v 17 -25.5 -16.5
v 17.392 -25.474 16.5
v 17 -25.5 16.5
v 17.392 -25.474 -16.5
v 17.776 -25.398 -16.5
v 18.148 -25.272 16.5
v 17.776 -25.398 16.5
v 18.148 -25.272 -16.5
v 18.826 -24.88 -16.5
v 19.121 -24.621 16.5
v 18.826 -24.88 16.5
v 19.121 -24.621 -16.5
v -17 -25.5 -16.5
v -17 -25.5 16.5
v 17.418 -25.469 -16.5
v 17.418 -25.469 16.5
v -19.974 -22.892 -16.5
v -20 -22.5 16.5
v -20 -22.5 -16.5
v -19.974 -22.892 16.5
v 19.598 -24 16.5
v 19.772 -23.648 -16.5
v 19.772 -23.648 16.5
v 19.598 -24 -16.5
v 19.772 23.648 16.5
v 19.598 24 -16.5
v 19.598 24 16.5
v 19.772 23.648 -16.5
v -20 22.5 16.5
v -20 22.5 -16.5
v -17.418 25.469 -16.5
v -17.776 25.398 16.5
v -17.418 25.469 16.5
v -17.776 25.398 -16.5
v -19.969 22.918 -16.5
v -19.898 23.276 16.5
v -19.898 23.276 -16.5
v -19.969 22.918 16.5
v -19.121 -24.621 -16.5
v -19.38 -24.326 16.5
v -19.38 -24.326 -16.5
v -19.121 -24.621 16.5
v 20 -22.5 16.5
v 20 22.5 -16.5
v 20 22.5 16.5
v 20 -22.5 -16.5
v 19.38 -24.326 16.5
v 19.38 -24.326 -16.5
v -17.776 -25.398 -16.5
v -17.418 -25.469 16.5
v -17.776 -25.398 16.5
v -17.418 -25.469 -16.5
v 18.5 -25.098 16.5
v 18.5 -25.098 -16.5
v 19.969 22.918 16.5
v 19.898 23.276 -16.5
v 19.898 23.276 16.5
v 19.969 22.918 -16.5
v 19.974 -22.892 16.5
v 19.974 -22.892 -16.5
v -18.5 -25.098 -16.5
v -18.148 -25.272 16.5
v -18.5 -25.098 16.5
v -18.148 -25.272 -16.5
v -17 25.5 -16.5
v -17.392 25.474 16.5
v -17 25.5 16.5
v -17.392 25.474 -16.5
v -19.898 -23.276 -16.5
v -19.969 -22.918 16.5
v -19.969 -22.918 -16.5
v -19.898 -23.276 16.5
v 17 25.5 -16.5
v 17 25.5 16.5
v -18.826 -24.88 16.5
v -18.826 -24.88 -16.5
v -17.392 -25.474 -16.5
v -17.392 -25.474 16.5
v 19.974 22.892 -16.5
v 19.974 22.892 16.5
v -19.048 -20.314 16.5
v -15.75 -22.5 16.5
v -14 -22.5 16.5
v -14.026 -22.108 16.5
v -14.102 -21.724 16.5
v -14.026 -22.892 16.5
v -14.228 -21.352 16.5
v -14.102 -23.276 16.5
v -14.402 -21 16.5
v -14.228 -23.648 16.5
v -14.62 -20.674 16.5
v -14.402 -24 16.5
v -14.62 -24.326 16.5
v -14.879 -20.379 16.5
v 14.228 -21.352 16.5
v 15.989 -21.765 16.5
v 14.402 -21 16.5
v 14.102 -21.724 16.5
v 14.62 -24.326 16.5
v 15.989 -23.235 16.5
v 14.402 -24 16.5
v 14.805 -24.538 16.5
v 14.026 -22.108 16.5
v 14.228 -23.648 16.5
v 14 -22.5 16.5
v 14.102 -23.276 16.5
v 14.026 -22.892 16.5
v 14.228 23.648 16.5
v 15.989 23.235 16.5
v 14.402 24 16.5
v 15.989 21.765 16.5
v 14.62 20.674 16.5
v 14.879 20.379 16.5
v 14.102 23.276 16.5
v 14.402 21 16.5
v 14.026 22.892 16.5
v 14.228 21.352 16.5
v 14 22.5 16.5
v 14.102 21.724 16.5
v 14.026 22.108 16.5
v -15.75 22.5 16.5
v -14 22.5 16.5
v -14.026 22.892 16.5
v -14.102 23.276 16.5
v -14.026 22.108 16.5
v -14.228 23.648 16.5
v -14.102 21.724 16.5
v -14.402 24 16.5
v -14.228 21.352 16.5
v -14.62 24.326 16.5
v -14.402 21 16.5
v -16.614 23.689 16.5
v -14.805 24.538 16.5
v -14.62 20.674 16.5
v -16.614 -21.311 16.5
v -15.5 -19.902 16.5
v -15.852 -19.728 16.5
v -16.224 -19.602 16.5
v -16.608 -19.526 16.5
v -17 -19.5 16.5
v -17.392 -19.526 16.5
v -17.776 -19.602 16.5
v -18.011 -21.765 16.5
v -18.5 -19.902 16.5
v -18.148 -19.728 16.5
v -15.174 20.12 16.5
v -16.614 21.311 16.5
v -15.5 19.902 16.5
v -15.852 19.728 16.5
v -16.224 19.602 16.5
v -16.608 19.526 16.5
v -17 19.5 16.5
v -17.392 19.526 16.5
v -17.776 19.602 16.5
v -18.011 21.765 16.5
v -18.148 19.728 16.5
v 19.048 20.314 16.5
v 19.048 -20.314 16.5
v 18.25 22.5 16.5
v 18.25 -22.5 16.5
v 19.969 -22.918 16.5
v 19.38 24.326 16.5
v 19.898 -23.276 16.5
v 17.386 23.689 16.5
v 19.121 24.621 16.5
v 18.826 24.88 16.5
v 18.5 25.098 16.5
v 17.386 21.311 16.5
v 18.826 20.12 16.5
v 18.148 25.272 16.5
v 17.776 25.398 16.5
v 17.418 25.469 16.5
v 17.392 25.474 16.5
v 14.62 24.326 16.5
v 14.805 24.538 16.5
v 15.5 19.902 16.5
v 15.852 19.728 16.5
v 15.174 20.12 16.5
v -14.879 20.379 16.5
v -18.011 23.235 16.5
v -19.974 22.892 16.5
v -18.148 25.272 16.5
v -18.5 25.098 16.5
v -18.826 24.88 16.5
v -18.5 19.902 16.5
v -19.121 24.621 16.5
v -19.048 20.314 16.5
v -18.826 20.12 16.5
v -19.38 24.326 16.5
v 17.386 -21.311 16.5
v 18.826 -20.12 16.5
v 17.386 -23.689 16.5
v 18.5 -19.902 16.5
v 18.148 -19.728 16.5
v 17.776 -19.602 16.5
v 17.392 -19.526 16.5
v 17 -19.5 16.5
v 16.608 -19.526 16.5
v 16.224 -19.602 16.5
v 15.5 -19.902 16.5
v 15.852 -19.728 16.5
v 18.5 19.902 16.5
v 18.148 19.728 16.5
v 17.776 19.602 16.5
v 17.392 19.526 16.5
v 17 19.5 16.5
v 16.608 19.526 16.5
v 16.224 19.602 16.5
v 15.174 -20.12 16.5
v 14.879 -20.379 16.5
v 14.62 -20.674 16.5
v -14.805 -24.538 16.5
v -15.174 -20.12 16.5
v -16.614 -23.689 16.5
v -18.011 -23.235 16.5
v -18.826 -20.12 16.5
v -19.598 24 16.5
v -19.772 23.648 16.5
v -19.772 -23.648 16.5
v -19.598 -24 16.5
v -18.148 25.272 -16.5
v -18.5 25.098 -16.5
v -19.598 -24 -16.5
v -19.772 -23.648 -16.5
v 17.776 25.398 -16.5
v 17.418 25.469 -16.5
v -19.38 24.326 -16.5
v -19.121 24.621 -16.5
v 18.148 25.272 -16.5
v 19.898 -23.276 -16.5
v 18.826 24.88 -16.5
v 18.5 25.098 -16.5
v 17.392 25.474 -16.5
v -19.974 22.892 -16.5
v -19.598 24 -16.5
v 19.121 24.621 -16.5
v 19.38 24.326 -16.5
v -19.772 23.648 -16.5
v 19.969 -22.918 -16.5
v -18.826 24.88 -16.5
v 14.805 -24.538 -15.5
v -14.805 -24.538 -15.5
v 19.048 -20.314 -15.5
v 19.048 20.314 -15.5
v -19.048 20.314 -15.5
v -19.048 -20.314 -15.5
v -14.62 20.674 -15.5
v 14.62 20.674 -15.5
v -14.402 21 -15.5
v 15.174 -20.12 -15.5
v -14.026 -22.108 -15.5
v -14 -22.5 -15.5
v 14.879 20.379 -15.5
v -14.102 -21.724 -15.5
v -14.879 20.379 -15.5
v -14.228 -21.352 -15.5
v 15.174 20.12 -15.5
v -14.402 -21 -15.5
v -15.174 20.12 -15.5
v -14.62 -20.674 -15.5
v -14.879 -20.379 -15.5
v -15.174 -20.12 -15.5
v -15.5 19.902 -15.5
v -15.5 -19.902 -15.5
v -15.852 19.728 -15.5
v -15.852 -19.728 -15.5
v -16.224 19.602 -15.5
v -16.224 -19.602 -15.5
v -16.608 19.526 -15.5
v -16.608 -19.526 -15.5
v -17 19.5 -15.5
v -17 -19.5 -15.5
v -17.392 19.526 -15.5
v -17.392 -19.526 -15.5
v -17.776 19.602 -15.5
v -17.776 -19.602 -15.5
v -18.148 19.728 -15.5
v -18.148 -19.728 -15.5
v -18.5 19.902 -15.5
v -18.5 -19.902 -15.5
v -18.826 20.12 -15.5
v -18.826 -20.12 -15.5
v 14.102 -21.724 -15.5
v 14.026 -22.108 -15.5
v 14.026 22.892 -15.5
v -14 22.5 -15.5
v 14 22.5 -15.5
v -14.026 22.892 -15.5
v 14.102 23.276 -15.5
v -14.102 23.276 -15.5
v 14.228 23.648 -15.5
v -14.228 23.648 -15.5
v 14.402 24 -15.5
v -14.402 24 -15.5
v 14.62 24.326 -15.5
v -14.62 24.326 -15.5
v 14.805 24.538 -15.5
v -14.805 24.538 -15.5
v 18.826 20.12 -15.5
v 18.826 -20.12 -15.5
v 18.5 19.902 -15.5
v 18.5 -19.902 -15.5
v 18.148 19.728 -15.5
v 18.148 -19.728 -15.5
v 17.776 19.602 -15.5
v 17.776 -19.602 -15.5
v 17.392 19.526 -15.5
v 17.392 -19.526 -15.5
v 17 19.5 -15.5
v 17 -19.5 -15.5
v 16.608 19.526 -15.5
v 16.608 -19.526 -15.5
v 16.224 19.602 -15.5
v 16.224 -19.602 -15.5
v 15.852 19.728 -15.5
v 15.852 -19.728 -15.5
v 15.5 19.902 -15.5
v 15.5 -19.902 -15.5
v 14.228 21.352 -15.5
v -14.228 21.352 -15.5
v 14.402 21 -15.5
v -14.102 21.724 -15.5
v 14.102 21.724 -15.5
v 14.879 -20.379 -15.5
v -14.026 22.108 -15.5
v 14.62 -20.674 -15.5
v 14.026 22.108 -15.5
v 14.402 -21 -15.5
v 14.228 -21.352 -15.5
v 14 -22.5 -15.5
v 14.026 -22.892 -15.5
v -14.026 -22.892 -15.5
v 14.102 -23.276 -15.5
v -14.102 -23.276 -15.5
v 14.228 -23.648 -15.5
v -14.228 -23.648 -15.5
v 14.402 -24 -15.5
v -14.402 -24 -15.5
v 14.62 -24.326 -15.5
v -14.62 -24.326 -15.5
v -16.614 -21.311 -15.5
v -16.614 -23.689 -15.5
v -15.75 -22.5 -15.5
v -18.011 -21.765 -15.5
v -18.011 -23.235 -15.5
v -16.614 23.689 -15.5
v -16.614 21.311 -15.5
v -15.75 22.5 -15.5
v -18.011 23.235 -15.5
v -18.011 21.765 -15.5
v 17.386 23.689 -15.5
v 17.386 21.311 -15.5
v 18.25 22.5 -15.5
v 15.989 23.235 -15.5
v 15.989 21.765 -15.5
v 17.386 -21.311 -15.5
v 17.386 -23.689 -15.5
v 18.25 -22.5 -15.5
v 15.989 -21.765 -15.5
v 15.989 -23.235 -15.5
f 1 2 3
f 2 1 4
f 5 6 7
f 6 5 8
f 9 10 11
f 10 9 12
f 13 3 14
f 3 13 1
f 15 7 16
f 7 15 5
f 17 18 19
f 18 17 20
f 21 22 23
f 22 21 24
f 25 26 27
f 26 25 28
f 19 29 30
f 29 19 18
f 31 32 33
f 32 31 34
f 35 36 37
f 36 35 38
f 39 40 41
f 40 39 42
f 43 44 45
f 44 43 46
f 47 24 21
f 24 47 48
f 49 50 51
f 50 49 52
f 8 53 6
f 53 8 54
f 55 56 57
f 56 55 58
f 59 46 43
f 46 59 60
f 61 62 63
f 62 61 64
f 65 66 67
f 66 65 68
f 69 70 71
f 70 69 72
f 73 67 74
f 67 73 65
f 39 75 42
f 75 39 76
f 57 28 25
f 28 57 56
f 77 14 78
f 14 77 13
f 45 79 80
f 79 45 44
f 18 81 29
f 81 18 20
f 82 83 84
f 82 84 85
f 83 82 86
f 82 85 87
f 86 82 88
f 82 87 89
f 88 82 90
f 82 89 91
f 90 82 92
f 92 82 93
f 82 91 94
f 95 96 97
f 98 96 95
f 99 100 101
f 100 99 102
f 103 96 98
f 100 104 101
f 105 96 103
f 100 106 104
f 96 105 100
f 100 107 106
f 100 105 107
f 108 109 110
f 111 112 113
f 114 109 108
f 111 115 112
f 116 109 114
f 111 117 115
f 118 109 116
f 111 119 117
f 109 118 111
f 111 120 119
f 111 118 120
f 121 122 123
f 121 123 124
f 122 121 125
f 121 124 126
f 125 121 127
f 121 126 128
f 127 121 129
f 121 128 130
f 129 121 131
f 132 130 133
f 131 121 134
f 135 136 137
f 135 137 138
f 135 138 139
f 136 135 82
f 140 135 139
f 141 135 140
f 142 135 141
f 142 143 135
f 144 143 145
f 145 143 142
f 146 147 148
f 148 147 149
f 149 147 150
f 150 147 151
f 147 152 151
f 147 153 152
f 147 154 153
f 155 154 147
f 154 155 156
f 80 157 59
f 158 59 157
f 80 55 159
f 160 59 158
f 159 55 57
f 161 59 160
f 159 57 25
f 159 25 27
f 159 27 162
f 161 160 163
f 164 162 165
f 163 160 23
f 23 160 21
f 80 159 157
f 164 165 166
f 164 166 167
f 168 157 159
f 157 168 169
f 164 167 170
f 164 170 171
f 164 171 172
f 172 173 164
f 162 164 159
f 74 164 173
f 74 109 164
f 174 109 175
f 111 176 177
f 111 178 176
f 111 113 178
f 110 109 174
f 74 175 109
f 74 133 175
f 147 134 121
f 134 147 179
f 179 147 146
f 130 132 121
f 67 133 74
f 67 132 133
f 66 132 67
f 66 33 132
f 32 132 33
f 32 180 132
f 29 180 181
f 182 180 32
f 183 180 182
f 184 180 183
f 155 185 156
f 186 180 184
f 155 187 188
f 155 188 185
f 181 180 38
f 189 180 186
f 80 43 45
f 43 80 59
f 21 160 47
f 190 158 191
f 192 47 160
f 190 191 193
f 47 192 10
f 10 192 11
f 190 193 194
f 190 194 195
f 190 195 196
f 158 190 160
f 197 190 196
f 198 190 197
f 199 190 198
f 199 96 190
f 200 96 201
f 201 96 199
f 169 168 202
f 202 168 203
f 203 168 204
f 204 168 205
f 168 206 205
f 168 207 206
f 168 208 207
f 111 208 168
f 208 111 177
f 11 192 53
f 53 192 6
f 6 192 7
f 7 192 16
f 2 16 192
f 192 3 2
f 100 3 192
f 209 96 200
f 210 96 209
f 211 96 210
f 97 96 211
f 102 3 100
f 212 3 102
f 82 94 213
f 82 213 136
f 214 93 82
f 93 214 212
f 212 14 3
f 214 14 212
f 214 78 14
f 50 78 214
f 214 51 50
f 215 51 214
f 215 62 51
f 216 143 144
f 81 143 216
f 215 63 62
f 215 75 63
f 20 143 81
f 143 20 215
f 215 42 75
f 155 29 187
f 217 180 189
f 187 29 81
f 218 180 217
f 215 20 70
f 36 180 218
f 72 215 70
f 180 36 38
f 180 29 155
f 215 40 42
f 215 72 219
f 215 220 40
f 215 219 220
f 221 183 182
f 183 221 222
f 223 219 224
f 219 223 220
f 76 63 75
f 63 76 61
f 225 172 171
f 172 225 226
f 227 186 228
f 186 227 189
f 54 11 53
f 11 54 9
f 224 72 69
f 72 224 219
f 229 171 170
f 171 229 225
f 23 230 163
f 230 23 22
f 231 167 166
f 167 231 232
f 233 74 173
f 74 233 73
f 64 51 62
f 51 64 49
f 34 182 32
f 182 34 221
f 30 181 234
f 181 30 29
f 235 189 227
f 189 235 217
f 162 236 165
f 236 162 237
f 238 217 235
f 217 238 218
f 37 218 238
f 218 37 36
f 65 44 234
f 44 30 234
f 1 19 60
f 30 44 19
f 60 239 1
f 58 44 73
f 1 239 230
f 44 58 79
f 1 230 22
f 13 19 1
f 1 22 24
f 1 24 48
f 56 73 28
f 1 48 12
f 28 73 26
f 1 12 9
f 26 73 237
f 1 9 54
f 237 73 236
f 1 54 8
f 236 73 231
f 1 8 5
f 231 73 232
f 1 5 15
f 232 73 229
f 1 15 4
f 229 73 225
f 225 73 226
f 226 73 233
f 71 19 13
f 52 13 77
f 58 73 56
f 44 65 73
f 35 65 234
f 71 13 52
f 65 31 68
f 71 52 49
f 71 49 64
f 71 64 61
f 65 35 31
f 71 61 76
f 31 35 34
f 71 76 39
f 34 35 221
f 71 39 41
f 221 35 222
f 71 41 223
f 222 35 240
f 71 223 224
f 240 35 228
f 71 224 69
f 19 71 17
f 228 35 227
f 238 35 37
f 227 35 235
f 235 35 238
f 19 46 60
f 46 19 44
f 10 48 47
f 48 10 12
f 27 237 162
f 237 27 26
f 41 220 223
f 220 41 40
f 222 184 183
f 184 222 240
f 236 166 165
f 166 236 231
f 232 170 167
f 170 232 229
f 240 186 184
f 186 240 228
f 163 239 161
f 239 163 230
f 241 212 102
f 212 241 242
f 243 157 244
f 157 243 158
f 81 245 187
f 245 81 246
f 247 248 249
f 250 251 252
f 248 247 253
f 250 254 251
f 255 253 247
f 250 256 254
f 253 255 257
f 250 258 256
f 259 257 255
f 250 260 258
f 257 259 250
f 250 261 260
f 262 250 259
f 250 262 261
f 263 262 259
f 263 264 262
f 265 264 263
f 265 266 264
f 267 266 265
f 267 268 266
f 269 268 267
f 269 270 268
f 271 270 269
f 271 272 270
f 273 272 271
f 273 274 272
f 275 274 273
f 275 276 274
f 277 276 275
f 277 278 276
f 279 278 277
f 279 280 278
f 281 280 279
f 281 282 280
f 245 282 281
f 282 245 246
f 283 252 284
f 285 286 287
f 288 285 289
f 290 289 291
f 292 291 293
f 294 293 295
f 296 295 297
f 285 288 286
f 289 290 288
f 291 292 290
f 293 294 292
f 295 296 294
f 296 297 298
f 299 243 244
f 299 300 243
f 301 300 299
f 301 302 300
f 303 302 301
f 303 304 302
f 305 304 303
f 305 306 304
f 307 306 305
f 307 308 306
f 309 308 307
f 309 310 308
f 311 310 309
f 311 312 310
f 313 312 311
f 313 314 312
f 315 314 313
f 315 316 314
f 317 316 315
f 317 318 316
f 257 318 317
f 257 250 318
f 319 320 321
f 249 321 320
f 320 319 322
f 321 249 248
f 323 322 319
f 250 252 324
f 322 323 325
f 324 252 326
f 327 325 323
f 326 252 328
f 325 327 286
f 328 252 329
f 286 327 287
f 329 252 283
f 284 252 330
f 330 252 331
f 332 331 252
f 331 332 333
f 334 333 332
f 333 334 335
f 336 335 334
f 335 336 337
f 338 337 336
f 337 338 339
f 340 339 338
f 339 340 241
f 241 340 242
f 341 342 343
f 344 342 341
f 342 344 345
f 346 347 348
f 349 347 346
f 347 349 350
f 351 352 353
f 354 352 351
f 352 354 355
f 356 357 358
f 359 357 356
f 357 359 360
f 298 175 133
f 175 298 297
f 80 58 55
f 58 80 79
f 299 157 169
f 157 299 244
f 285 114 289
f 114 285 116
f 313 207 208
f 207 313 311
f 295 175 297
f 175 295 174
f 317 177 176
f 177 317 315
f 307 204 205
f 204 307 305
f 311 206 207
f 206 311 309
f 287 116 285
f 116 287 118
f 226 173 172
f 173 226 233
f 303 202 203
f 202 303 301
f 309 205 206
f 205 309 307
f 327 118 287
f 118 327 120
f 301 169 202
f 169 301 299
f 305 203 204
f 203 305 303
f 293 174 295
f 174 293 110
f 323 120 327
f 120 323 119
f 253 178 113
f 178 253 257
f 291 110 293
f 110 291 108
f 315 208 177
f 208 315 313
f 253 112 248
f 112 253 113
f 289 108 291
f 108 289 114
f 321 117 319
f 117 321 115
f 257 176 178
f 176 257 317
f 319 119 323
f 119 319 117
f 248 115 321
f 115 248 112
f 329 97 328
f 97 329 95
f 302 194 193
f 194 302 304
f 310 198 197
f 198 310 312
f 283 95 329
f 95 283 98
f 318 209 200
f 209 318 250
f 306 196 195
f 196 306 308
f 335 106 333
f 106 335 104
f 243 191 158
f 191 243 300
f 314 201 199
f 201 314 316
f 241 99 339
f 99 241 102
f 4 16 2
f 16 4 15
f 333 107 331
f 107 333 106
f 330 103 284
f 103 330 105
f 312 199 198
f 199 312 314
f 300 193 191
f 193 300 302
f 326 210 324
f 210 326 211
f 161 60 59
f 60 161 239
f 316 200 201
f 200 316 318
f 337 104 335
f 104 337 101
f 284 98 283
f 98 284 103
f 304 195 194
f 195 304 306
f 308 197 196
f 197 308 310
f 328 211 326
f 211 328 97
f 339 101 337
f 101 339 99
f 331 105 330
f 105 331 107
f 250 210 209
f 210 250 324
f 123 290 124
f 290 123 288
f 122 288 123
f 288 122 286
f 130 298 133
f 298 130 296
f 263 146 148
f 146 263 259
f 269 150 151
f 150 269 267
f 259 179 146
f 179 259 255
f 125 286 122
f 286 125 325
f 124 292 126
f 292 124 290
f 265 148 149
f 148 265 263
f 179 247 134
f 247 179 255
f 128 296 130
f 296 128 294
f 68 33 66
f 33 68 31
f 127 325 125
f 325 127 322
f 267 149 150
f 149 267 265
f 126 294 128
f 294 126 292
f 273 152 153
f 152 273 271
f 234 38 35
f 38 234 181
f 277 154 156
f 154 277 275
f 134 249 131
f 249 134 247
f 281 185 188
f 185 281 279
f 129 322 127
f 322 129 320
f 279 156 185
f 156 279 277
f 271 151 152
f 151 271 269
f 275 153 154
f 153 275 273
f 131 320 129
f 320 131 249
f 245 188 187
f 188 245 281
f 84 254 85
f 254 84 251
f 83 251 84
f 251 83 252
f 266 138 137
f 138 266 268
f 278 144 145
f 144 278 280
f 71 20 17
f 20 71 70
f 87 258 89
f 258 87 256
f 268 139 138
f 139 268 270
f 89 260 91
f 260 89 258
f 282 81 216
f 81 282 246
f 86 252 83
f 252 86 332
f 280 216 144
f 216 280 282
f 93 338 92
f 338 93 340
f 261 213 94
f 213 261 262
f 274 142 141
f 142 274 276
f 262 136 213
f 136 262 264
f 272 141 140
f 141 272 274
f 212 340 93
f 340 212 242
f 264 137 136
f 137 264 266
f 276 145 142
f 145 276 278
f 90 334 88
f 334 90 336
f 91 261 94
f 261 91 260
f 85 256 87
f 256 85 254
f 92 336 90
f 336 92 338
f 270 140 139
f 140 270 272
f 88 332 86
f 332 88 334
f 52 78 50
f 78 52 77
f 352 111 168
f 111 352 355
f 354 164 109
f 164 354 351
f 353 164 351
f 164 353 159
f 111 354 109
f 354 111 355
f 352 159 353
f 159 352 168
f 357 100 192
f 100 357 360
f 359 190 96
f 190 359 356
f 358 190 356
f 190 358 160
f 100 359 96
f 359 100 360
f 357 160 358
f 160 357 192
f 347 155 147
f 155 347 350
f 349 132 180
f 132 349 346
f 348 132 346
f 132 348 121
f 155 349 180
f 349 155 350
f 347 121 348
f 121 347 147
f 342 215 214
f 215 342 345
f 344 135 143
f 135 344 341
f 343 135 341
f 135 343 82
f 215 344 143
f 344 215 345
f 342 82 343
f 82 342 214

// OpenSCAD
// definitions

// box dimensions
w = 40;
l = 51;
d = 33;
thick = 2;
fillet = 3;

// MAX chip location, used also for bolts and mounts
x_MAX = -w/2+1.3;
y_MAX = 0;
z_MAX = 1;

// set up modules

module outer(width, length, depth, fillet) {
    linear_extrude(depth, center = true)
    offset(r = +fillet) offset(delta = -fillet) {
        square([width, length], center = true);
    }
}

module bolt_mounts(w, l, d, fillet, diam) {
    x = w/2-fillet;
    y = l/2-fillet;
    points = [[x,y,0], [x,-y,0], [-x,y,0], [-x,-y,0]];
    module mounts() {
        for (p = points){
            translate(p) cylinder(r=fillet, h=d, center=true);
        }
    }
    module holes() {
        points = [[x,y,0.1], [x,-y,0.1], [-x,y,0.1], [-x,-y,0.1]];
        for (p = points){
            translate(p) cylinder(d=diam, h=d, center=true, $fn = 5);
        }
    }
    difference(){
        mounts();
        holes();
    }
}

module r_box(width, length, depth, thickness, fillet) {
	difference() {
        // main box
        // outer
        outer(width = width, length = length, depth = depth, fillet = fillet);
        // inner
        translate([0, 0, thickness/2])
        scale([width/(width+thickness), length/(length+thickness), 1]) // [x,y,z]
        outer(width = width, length = length, depth = depth, fillet = fillet);
    }
}

// enclosure
module enclosure() {
    $fa = 1;
    $fs = 0.4;
    union() {
        r_box(width = w, length = l, depth = d, thickness = thick, fillet = fillet);
        bolt_mounts(w, l, d, fillet = fillet, diam = 2.5);
    }
}

enclosure();
